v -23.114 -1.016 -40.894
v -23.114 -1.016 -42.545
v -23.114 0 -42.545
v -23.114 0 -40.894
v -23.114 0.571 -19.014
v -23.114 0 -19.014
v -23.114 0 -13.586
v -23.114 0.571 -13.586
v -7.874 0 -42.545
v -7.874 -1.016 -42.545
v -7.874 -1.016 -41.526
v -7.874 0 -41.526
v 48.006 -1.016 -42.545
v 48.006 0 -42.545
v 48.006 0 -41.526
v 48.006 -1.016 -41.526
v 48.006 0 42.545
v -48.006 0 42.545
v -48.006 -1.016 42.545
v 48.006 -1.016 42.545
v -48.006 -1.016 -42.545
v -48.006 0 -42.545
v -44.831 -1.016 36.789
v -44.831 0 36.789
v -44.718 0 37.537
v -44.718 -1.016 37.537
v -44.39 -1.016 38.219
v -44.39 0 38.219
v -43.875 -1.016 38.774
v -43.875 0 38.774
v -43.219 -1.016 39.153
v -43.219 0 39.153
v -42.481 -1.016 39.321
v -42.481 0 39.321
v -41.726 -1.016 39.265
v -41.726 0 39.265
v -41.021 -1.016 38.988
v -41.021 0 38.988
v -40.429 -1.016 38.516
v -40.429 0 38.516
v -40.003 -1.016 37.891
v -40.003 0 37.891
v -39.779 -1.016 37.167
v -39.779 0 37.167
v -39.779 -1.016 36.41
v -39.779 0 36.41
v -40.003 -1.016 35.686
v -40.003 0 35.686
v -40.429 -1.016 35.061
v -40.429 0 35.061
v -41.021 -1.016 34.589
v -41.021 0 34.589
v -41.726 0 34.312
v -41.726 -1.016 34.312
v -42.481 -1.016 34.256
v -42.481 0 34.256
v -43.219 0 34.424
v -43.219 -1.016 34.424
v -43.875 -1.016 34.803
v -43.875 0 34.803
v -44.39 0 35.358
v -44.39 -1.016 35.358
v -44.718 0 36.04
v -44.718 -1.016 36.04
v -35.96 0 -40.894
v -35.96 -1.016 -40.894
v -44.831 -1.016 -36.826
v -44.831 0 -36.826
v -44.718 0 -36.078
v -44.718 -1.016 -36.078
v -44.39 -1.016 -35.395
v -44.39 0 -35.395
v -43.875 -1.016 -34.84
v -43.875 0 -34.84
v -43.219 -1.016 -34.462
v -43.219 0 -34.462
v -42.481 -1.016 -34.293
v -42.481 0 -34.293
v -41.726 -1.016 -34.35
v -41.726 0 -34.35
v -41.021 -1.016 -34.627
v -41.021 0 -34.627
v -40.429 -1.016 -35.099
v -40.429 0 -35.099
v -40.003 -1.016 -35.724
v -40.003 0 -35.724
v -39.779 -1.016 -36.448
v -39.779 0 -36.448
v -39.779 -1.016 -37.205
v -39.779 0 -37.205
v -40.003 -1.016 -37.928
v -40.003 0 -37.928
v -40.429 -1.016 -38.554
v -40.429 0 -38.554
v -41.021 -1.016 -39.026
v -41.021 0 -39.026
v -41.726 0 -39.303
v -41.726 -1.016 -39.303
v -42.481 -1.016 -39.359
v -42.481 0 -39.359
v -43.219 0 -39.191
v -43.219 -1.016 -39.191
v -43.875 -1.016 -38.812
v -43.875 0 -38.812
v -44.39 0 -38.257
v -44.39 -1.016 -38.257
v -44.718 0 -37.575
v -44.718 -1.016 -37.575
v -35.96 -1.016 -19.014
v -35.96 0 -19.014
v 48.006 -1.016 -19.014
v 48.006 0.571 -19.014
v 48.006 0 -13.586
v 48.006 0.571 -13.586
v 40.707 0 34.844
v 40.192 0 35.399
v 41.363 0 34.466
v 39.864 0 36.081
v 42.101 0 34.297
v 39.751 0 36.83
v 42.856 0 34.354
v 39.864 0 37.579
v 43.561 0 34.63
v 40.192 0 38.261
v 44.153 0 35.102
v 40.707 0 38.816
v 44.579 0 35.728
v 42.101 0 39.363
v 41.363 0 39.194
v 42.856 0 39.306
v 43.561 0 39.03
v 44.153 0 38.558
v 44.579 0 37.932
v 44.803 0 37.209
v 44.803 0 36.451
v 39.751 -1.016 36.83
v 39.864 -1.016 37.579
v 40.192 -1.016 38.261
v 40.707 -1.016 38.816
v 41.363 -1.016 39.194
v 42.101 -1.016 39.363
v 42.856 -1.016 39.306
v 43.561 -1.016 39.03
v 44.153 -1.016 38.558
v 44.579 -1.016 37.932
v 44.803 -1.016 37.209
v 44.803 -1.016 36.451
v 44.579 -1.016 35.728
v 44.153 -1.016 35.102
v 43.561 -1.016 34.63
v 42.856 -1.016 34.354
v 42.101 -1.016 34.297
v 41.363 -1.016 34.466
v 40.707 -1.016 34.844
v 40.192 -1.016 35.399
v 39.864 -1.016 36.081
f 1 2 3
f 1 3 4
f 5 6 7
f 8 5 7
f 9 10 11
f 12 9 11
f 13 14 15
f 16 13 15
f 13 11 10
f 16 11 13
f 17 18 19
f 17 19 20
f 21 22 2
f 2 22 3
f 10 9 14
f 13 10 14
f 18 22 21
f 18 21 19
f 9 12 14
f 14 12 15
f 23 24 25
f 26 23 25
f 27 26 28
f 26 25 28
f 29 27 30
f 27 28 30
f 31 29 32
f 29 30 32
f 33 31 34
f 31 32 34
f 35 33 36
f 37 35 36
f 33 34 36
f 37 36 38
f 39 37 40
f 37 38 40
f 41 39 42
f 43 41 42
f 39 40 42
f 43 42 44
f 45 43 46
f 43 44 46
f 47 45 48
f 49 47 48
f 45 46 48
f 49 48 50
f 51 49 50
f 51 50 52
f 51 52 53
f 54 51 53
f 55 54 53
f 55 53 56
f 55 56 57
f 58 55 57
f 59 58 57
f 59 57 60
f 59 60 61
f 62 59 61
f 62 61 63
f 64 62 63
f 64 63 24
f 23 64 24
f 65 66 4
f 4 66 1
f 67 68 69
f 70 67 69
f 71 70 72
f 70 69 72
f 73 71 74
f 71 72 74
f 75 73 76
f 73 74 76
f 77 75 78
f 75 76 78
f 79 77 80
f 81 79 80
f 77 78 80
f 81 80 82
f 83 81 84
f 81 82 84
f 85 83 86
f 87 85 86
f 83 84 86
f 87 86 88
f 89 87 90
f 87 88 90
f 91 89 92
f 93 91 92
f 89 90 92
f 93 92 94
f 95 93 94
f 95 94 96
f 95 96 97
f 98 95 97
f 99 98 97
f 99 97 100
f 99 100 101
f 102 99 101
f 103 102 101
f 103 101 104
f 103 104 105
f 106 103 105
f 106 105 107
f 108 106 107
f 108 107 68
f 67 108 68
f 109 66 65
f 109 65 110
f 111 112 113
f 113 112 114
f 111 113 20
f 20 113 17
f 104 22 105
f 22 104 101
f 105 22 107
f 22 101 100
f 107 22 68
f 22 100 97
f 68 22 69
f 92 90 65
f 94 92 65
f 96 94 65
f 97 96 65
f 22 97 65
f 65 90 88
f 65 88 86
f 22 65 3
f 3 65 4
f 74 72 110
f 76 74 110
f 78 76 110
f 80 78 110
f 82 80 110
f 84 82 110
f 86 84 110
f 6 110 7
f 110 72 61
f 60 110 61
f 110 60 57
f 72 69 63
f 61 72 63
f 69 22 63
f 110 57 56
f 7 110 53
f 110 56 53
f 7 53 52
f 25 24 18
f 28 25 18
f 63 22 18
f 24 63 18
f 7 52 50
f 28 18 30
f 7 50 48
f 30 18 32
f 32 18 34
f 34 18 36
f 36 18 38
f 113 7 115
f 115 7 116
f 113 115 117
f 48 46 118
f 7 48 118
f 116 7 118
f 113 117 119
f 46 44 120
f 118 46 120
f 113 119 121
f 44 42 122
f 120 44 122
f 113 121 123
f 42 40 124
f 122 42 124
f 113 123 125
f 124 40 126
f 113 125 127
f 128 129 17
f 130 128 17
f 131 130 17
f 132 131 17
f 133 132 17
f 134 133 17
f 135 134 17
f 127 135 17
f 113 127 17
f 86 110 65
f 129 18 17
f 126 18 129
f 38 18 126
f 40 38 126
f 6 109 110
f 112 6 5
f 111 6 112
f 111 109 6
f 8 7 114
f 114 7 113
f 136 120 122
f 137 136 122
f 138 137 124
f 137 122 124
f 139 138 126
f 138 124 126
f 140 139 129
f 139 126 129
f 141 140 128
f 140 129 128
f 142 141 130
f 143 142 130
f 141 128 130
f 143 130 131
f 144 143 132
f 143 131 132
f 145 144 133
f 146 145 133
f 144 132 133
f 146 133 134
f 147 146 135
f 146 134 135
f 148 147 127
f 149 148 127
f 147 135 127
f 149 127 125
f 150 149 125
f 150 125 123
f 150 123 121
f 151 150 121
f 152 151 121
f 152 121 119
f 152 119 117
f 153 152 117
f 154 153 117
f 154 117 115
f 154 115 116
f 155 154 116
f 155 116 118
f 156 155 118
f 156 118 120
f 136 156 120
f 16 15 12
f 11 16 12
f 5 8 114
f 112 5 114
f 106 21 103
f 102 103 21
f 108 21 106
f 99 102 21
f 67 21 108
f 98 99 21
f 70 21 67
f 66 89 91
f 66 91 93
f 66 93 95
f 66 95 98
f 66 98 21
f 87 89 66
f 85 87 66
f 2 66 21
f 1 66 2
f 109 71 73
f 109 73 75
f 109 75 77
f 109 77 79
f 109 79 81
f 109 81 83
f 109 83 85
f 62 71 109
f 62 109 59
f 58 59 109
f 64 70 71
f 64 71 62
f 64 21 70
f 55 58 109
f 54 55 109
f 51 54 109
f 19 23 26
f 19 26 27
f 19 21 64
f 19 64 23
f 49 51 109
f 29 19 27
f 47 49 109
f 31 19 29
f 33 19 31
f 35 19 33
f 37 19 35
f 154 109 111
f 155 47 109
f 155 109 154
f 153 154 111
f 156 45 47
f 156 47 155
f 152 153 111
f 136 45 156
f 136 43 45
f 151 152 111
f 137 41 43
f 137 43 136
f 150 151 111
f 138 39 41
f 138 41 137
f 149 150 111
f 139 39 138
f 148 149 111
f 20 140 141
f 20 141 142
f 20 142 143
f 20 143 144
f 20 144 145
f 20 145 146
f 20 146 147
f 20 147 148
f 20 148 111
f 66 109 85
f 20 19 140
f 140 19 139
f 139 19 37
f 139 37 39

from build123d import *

# Parameters (mm, degrees)
F0_W      = 96.012
F0_H      = 85.09
F1_DEPTH  = 1.016
F3_W      = 59.69
F3_H      = 27.94
F4_DEPTH  = 25.4
F5_W      = 15.24
F5_H      = 28.9585393873
F6_DEPTH  = 25.4
F7_W      = 71.1203183985
F7_H      = 5.427393131
F8_DEPTH  = 1.5875
F9_W      = 12.8458908007
F9_H      = 21.8801462563
F10_DEPTH = 3.175
F12_D     = 5.08


with BuildPart() as f1:
    # F0 (on Front) → F1 (new body)
    with BuildSketch(Plane.XZ):
        Rectangle(F0_W, F0_H)
    extrude(amount=F1_DEPTH)

    # F3 (on face) → F4 (cut)
    with BuildSketch(Plane(origin=(0, 0, 0), x_dir=(-1, 0, 0), z_dir=(0, 1, 0))):
        with Locations((-21.9706816015, -27.5564606127)):
            Rectangle(F3_W, F3_H)
    extrude(amount=-F4_DEPTH, mode=Mode.SUBTRACT)

    # F5 (on face) → F6 (cut)
    with BuildSketch(Plane.XZ.offset(1.016)):
        with Locations((-15.4943183985, -28.0657303064)):
            Rectangle(F5_W, F5_H)
    extrude(amount=-F6_DEPTH, mode=Mode.SUBTRACT)

    # F7 (on face) → F8 (join)
    with BuildSketch(Plane.XZ.offset(1.016)):
        with Locations((12.4458408007, -16.3001571782)):
            Rectangle(F7_W, F7_H)
    extrude(amount=-F8_DEPTH)

    # F9 (on face) → F10 (cut)
    with BuildSketch(Plane.XZ.offset(1.016)):
        with Locations((-29.5372637989, -29.9539268718)):
            Rectangle(F9_W, F9_H)
    extrude(amount=-F10_DEPTH, mode=Mode.SUBTRACT)

    # F12 (through all)
    with Locations(Plane.XZ.offset(1.016)):
        with Locations((-42.291, 36.7885453174), (-42.291, -36.82624842), (42.291, 36.83)):
            Hole(F12_D / 2)


solid = f1.part
